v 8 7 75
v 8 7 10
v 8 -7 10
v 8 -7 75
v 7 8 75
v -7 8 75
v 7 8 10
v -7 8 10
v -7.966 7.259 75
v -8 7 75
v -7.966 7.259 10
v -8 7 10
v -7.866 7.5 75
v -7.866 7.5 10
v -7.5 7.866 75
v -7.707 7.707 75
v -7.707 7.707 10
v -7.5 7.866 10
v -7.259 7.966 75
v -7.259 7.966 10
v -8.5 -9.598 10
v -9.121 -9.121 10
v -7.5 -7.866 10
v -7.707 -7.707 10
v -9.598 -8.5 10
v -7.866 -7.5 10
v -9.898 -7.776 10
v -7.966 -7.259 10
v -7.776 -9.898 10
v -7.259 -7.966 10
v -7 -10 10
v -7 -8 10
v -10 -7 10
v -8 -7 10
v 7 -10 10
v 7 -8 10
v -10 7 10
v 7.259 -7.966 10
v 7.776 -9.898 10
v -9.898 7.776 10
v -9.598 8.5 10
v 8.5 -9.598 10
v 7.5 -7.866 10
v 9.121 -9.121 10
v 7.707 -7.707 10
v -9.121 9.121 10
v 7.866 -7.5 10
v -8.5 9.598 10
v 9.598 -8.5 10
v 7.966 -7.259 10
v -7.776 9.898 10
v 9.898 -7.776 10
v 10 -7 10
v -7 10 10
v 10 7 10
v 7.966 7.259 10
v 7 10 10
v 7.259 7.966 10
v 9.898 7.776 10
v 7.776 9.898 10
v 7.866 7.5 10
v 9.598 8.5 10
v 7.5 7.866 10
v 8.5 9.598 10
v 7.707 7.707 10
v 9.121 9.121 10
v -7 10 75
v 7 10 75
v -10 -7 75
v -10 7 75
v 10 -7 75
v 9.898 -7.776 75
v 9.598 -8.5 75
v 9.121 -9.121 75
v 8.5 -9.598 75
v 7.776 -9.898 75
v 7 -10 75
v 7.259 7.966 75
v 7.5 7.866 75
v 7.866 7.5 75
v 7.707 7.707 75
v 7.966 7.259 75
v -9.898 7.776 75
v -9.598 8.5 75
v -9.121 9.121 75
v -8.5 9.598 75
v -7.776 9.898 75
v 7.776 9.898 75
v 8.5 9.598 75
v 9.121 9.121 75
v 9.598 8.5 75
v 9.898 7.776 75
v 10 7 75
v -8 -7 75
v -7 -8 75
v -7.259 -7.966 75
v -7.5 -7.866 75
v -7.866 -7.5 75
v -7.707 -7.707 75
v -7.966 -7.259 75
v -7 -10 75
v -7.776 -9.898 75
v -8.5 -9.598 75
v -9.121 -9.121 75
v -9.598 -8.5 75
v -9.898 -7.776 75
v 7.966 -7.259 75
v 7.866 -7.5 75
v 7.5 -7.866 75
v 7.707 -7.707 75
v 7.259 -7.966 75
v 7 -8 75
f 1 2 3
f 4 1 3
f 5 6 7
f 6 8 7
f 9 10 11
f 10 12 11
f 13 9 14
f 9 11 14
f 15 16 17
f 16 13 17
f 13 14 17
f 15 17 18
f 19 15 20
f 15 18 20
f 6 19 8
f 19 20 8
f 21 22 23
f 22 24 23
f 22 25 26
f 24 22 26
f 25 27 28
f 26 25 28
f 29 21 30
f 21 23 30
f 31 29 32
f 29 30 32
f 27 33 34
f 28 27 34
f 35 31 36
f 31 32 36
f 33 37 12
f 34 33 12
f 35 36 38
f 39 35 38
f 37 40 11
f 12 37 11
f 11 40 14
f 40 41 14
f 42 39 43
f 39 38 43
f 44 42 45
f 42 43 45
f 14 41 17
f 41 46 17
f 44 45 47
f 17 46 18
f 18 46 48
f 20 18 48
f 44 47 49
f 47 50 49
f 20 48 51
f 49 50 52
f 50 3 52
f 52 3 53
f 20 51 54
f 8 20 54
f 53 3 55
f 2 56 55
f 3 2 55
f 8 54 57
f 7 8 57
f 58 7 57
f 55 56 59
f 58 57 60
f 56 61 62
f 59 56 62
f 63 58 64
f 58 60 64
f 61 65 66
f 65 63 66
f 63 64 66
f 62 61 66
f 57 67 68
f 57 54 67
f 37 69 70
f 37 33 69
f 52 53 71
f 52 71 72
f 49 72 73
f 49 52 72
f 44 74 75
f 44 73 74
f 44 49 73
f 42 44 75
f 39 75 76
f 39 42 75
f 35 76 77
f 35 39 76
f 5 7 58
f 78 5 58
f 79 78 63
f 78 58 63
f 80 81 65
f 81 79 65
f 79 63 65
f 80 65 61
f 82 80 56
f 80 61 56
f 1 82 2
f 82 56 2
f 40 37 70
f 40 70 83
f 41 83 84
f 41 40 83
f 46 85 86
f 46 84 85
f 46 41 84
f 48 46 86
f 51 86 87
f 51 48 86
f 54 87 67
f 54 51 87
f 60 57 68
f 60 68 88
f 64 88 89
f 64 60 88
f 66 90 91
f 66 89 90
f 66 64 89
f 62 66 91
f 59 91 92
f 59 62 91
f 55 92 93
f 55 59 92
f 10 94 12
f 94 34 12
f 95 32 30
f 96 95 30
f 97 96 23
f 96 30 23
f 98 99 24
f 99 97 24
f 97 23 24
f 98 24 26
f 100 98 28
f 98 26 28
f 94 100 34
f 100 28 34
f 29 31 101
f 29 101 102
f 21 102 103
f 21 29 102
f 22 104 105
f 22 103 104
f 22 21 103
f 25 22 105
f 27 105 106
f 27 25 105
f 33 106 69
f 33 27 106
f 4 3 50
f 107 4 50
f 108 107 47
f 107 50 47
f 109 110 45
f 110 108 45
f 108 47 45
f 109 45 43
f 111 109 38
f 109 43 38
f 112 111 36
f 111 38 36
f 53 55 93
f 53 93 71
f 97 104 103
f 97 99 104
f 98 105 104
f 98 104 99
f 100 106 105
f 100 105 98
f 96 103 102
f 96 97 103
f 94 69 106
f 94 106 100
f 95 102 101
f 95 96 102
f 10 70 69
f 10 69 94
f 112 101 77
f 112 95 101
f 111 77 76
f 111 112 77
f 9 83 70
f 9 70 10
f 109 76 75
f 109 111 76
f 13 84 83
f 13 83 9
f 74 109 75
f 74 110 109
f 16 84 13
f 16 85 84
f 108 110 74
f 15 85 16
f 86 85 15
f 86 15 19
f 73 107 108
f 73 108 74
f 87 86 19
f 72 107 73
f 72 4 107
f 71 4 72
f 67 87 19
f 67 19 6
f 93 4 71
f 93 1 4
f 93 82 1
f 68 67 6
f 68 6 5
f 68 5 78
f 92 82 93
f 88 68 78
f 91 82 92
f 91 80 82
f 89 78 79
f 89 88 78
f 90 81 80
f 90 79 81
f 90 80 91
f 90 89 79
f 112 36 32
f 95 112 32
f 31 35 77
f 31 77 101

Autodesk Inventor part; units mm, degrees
ref_plane "Start Plane" through (0, 0, 10) normal (0, 0, 1) x (1, 0, 0)
ref_plane "End Plane" through (0, 0, 75) normal (0, 0, 1) x (1, 0, 0)
sketch "Sketch" plane through (0, 0, 0) normal (0, 0, 1) x (1, 0, 0)
  line L0 (-10, -7) -> (-10, 7)
  line L1 (-7, 10) -> (7, 10)
  line L2 (10, 7) -> (10, -7)
  line L3 (7, -10) -> (-7, -10)
  arc A0 (-10, -7) -> (-7, -10) centre (-7, -7) ccw
  arc A1 (-7, 10) -> (-10, 7) centre (-7, 7) ccw
  arc A2 (10, 7) -> (7, 10) centre (7, 7) ccw
  arc A3 (7, -10) -> (10, -7) centre (7, -7) ccw
  arc A4 (-7, 8) -> (-8, 7) centre (-7, 7) ccw
  line L4 (-7, 8) -> (7, 8)
  arc A5 (8, 7) -> (7, 8) centre (7, 7) ccw
  line L5 (8, 7) -> (8, -7)
  arc A6 (7, -8) -> (8, -7) centre (7, -7) ccw
  line L6 (7, -8) -> (-7, -8)
  arc A7 (-8, -7) -> (-7, -8) centre (-7, -7) ccw
  line L7 (-8, -7) -> (-8, 7)
  line L8 (0, 14.8698) -> (0, -14.8698) construction
  line L9 (-14.8698, 0) -> (14.8698, 0) construction
  dimension "d7" = 3
  dimension "d10" = 20
  dimension "d11" = 20
  dimension "d12" = 2
  dimension "d15" = 10
  dimension "d16" = 10
extrude "Body" add sketch "Sketch" along normal up to surface (65 mm away) from surface at 10
sketch "Sketch3" plane through (0, 0, 0) normal (0, 0, 1) x (1, 0, 0)
  line L0 (0, 0) -> (10, 0)
ref_plane "Work Plane3" through (0, 0, 0) normal (0, -1, 0) x (1, 0, 0)
sketch "Sketch4" plane through (0, 0, 0) normal (0, -1, 0) x (1, 0, 0)
  line L0 (-2, 10) -> (12, 10)
  line L1 (-2, 75) -> (12, 75)
  dimension "d18" = 65
ref_plane "Work Plane4" through (7, -120, 10) normal (0, 0, -1) x (-1, 0, 0)
split "Split1" plane through (7, -120, 10) removes the side toward (0, 0, -1)
equation "\"d7\" = G_IR"
equation "\"d10\" = G_H"
equation "\"d11\" = G_W"
equation "\"d12\" = G_T"
equation "\"d15\" = 0.5 * d10"
equation "\"d16\" = 0.5 * d11"
equation "\"d3\" = G_L"
equation "\"G_W\" = 20"
equation "\"G_H\" = 20"
equation "\"G_T\" = 2"
equation "\"G_IR\" = 3"
equation "\"G_L\" = d18"
equation "\"G_OFFSET_END\" = 0"
equation "\"d14\" = G_OFFSET_END + B_L"
equation "\"B_L\" = 75"
properties part number "ISO 12633-2 - 20x20x2 - 65" material "Steel, Mild"
